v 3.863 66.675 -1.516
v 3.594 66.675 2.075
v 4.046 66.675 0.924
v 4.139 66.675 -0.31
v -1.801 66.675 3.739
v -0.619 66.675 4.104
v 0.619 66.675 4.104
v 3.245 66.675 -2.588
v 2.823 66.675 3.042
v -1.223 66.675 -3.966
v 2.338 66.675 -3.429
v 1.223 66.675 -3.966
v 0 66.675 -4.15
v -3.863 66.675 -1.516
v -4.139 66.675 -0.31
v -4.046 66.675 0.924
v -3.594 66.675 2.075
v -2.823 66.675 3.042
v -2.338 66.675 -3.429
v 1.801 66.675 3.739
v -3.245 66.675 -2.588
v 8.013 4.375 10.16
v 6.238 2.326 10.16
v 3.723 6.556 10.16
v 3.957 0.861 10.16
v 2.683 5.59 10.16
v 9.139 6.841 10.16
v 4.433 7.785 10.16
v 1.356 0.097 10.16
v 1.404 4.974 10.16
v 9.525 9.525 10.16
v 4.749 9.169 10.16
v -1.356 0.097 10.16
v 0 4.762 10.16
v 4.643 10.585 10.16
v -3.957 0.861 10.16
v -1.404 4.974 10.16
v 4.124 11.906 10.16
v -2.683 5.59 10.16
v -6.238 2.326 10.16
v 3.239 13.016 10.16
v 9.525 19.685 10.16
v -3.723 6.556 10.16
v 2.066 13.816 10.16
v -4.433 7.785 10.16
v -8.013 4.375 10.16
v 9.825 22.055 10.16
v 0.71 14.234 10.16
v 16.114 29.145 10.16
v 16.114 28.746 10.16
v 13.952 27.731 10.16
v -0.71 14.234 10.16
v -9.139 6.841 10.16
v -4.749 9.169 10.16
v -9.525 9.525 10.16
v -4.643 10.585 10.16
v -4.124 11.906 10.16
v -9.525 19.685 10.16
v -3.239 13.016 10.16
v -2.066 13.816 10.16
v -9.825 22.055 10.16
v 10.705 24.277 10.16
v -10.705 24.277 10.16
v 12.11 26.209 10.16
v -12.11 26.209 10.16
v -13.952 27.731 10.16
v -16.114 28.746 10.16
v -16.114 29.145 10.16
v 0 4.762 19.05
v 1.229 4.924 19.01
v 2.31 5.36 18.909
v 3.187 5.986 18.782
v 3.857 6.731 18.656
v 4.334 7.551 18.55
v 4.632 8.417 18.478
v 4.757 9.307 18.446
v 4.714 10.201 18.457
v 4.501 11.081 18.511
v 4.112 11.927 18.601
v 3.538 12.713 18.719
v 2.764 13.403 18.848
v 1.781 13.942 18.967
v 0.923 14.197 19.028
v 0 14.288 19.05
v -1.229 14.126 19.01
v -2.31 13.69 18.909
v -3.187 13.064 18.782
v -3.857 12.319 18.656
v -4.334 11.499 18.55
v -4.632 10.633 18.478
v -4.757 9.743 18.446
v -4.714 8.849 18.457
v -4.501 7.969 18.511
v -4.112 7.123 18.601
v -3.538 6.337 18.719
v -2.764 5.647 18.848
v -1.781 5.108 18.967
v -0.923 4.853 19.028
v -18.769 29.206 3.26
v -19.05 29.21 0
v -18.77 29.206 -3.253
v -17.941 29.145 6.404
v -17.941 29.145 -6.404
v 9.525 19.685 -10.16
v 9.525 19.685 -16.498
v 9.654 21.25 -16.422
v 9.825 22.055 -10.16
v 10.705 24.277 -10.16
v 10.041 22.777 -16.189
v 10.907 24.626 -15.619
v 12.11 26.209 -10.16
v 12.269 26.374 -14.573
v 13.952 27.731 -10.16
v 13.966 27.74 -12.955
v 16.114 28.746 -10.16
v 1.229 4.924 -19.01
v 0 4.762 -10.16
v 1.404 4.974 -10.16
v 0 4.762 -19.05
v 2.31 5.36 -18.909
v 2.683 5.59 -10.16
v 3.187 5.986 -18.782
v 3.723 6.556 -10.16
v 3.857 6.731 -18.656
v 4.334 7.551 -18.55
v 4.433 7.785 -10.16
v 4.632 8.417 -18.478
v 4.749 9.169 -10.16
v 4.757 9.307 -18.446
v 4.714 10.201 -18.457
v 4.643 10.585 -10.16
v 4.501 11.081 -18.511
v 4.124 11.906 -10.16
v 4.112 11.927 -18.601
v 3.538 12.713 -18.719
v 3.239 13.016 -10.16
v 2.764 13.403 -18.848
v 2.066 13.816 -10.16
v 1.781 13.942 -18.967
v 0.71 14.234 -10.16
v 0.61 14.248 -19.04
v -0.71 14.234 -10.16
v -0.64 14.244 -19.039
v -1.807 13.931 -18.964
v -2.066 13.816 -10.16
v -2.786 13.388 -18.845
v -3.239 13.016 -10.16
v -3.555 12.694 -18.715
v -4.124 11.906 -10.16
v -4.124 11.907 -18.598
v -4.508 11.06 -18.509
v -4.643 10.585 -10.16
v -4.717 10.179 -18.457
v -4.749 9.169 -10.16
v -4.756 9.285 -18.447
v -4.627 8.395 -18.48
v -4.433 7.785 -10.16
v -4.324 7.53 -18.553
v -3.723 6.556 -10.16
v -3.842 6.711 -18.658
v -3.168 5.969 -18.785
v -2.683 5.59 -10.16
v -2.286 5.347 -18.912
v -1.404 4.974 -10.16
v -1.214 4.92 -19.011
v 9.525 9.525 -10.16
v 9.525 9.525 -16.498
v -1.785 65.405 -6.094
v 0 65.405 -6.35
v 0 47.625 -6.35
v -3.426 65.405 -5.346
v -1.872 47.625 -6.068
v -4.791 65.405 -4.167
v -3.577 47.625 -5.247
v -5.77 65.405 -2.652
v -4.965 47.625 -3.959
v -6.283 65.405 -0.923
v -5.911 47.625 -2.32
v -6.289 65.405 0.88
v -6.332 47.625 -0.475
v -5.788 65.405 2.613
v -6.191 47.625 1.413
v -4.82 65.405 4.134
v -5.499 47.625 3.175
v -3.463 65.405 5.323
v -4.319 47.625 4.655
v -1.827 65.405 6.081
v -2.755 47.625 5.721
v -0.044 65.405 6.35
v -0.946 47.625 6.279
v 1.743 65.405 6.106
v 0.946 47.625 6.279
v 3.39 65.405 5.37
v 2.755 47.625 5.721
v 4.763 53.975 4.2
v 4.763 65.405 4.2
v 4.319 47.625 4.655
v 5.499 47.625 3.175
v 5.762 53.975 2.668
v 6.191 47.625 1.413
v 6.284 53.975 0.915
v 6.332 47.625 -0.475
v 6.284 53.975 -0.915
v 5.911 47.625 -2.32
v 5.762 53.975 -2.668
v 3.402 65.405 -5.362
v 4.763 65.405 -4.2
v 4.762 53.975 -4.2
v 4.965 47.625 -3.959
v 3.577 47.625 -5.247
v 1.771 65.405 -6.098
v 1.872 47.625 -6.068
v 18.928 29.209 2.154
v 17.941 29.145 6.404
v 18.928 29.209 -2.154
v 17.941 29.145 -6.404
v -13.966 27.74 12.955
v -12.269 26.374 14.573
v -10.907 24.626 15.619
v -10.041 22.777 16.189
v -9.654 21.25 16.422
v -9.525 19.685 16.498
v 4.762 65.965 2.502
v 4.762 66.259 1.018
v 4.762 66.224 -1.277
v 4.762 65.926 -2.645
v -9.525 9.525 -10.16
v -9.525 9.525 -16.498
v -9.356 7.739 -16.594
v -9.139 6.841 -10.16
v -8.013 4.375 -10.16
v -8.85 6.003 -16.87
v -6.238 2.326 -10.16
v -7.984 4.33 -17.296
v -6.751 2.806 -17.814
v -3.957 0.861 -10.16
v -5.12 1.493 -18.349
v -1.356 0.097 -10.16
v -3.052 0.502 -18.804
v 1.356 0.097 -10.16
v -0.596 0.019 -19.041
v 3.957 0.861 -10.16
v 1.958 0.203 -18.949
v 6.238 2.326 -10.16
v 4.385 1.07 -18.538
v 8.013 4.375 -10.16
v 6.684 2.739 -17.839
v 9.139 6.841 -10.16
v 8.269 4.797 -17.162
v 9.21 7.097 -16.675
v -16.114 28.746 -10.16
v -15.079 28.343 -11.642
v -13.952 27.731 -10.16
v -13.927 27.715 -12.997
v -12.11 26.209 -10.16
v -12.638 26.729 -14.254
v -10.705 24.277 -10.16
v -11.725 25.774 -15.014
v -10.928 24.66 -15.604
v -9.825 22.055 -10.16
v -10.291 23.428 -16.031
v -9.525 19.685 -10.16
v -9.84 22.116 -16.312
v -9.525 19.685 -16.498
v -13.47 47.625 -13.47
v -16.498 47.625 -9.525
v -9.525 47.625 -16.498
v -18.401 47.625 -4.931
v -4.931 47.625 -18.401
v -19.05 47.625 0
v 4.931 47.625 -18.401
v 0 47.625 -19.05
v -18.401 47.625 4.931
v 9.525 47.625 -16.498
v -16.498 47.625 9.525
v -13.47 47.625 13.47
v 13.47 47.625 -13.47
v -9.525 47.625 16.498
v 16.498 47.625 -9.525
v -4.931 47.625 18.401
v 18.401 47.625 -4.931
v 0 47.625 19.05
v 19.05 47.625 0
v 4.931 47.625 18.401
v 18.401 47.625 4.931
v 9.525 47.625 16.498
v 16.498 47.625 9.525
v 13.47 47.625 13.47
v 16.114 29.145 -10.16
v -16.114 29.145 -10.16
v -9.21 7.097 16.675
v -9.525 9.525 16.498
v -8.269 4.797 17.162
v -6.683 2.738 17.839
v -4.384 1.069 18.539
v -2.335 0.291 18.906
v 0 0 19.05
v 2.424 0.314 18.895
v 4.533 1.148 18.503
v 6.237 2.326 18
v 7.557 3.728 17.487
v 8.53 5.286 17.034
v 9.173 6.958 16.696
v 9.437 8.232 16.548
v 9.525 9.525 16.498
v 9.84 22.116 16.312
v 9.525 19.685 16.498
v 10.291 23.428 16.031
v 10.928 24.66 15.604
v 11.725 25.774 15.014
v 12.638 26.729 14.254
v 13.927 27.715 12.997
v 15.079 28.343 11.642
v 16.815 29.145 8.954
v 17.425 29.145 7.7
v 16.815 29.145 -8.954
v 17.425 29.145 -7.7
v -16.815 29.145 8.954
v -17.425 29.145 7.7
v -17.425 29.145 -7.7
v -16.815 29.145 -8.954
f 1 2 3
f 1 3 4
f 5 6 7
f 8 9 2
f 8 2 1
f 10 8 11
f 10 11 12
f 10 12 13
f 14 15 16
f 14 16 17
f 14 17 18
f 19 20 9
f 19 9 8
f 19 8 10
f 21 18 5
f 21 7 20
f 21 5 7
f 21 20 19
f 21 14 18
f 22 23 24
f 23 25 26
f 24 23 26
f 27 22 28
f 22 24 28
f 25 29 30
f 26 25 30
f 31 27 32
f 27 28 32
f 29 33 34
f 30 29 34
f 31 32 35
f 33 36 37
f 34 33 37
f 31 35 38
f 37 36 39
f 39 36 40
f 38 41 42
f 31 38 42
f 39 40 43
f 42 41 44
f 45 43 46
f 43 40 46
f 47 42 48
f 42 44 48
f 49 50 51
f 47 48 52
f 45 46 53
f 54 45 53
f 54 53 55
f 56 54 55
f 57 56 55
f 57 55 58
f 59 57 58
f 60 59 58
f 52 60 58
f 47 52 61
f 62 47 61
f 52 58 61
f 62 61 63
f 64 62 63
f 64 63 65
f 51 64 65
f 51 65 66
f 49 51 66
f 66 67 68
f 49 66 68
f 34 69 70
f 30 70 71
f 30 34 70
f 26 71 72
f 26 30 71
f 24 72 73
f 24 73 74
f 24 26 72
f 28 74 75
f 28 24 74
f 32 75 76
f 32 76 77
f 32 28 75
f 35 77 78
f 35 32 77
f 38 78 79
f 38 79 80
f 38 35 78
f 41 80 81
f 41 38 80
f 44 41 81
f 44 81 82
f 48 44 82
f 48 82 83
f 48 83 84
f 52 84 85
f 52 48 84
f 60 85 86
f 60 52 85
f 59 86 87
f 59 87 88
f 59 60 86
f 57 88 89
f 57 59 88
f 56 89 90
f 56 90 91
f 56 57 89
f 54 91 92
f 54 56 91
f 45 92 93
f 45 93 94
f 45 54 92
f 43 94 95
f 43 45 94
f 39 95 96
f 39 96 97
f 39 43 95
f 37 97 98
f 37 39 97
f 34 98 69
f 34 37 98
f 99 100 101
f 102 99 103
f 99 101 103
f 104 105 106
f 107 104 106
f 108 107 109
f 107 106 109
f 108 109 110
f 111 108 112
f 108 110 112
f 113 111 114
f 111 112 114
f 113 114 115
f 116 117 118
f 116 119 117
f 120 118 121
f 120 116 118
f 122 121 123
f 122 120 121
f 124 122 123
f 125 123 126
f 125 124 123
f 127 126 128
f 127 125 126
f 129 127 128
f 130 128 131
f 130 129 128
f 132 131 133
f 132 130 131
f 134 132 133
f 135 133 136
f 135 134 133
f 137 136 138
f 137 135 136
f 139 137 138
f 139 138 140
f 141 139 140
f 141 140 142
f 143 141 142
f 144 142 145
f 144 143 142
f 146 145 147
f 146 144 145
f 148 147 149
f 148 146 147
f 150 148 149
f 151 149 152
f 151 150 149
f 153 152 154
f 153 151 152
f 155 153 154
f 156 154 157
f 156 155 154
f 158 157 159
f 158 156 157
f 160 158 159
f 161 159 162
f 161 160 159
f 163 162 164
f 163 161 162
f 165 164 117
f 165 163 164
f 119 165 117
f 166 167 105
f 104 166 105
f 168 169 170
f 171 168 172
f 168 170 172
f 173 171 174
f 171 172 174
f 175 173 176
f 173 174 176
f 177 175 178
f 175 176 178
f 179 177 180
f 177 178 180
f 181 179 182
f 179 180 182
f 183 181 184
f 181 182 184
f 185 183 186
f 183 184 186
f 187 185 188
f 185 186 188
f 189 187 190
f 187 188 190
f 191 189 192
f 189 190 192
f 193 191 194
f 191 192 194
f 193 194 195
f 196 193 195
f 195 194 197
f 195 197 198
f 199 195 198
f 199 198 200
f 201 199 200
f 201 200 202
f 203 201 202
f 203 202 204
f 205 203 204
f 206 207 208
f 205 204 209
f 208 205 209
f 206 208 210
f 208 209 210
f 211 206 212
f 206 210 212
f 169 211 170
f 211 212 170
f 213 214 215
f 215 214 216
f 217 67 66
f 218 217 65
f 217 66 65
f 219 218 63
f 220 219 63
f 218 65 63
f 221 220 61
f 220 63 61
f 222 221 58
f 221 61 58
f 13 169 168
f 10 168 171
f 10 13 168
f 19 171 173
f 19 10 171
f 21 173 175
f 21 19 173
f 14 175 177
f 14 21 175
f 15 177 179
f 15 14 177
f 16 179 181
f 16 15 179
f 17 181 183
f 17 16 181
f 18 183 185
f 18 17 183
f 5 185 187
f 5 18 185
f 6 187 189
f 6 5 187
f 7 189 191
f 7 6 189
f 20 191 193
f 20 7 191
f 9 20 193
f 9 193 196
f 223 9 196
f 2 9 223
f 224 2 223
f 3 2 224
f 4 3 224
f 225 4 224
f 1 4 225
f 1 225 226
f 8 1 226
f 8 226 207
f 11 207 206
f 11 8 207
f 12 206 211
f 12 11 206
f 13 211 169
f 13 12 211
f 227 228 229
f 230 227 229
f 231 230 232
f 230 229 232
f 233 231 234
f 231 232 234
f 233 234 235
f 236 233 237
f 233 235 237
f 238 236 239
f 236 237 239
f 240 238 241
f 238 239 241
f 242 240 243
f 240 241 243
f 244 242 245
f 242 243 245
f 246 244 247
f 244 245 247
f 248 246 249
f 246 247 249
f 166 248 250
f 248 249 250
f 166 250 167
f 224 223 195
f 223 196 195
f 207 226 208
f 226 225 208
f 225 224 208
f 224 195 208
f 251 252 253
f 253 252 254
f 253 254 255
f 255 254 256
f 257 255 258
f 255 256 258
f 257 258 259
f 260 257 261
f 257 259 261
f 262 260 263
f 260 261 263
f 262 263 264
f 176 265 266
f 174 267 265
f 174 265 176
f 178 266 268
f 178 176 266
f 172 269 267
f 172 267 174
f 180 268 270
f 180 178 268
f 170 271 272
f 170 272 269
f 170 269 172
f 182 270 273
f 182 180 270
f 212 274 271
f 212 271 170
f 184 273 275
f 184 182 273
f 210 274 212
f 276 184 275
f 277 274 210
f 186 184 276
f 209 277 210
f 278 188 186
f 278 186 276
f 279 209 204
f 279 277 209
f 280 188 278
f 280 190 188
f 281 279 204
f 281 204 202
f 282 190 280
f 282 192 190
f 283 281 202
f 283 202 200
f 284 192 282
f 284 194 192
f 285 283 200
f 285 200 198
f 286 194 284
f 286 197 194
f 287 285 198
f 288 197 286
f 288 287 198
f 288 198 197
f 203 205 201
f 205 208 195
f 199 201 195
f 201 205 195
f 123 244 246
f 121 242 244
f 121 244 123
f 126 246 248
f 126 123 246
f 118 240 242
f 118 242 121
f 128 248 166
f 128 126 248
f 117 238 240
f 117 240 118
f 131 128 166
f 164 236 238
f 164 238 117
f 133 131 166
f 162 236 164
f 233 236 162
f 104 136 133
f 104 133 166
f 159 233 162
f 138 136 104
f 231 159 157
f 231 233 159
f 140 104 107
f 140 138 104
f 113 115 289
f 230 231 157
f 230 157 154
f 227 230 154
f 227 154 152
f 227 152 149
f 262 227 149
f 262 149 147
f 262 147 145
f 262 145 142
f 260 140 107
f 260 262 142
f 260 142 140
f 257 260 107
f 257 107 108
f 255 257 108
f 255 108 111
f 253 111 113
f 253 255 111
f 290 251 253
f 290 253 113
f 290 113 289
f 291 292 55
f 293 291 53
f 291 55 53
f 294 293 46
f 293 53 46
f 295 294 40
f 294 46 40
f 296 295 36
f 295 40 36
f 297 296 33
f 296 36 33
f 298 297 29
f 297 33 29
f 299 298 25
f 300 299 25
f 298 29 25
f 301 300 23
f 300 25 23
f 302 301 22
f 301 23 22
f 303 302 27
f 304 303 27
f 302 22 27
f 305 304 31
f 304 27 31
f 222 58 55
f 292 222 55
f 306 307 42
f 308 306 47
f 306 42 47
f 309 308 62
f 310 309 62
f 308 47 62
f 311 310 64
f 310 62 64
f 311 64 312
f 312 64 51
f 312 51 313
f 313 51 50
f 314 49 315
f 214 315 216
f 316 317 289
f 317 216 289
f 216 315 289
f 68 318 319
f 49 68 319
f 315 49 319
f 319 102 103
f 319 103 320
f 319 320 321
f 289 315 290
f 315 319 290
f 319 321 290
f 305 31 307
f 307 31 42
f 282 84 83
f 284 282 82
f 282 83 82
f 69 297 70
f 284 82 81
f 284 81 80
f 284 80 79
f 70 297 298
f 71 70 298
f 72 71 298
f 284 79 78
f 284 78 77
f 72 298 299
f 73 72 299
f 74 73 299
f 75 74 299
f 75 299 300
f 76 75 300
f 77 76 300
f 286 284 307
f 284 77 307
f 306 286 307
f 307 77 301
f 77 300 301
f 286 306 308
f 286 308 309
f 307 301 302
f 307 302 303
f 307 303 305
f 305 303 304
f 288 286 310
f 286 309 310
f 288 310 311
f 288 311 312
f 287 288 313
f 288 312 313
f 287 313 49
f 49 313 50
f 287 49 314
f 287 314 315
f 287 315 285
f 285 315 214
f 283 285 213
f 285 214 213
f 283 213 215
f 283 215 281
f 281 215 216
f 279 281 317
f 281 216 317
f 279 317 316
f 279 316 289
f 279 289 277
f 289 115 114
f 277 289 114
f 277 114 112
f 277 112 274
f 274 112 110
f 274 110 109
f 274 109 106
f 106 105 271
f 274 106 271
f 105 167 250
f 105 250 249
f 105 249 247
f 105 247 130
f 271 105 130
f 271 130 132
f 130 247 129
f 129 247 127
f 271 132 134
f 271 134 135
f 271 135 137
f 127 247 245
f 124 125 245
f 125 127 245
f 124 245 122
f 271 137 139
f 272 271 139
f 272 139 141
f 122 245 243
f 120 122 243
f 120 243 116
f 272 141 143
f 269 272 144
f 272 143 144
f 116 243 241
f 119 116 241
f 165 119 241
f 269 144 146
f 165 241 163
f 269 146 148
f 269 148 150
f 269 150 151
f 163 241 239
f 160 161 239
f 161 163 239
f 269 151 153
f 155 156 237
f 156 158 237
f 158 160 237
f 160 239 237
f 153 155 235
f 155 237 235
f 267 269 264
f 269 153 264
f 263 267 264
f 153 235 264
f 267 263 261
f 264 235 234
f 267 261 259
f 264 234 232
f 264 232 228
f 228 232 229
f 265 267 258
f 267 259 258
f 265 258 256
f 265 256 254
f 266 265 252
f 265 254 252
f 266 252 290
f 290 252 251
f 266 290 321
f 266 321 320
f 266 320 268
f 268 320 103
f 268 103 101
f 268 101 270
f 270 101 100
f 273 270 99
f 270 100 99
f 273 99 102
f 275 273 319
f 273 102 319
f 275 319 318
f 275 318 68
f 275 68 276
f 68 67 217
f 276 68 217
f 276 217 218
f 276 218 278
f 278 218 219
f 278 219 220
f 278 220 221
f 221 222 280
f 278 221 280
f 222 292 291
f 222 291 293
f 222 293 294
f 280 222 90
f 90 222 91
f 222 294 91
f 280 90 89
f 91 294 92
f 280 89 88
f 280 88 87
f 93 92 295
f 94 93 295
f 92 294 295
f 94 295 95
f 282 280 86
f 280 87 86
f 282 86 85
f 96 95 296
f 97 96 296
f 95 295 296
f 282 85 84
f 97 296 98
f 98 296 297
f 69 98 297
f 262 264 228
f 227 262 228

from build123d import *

# Parameters (mm, degrees)
SKETCH1_R               = 19.05
BASE_EXTRUDE_DEPTH      = 47.625
CUT_EXTRUDE1_DEPTH      = 55.716959208
CUT_EXTRUDE1_DEPTH_BACK = 55.716959208
CUT_EXTRUDE5_DEPTH      = 47.625
CUT_EXTRUDE5_DEPTH_BACK = 55.716959365
SKETCH8_W               = 20.32
SKETCH8_H               = 36.600526062
CUT_EXTRUDE6_DEPTH      = 55.716959365
CUT_EXTRUDE6_DEPTH_BACK = 55.716959365
SKETCH11_R              = 4.7625
SKETCH12_R              = 6.35
BOSS_EXTRUDE1_DEPTH     = 19.05
CHAMFER3_SIZE           = 1.27
CHAMFER3_SIZE2          = 2.199704526
CUT_EXTRUDE7_START      = -12.7
CUT_EXTRUDE7_DEPTH      = 12.7


with BuildPart() as part:
    # Sketch1 → Base-Extrude (new body)
    with BuildSketch(Plane(origin=(0, 0, 0), x_dir=(-1, 0, 0), z_dir=(0, 1, 0))):
        Circle(SKETCH1_R)
    extrude(amount=BASE_EXTRUDE_DEPTH)

    # Sketch2 → Cut-Extrude1 (cut, two sides: drawn at the far end of the back side and taken through both)
    with BuildSketch(Plane.XY.offset(-CUT_EXTRUDE1_DEPTH_BACK)):
        with BuildLine():
            Line((9.525, 9.525), (9.525, 19.685))
            ThreePointArc((9.525, 19.685), (12.314807909, 26.420192091), (19.05, 29.21))
            Line((19.05, 29.21), (19.05, -1.366191125))
            Line((19.05, -1.366191125), (-19.05, -1.366191125))
            Line((-19.05, -1.366191125), (-19.05, 29.21))
            ThreePointArc((-19.05, 29.21), (-12.314807909, 26.420192091), (-9.525, 19.685))
            Line((-9.525, 19.685), (-9.525, 9.525))
            ThreePointArc((-9.525, 9.525), (0, 0), (9.525, 9.525))
        make_face()
    extrude(amount=CUT_EXTRUDE1_DEPTH + CUT_EXTRUDE1_DEPTH_BACK, mode=Mode.SUBTRACT)

    # Sketch8 → Cut-Extrude5 (cut, two sides: drawn at the far end of the back side and taken through both)
    with BuildSketch(Plane(origin=(0, 0, 0), x_dir=(0, 0, -1), z_dir=(1, 0, 0)).offset(-CUT_EXTRUDE5_DEPTH_BACK)):
        with Locations((0, 10.844975795)):
            Rectangle(SKETCH8_W, SKETCH8_H)
    extrude(amount=CUT_EXTRUDE5_DEPTH + CUT_EXTRUDE5_DEPTH_BACK, mode=Mode.SUBTRACT)

    # Sketch11 → Cut-Extrude6 (cut, two sides: drawn at the far end of the back side and taken through both)
    with BuildSketch(Plane.XY.offset(-CUT_EXTRUDE6_DEPTH_BACK)):
        with Locations((0, 9.525)):
            Circle(SKETCH11_R)
    extrude(amount=CUT_EXTRUDE6_DEPTH + CUT_EXTRUDE6_DEPTH_BACK, mode=Mode.SUBTRACT)

    # Sketch12 → Boss-Extrude1 (add)
    with BuildSketch(Plane(origin=(0, 47.625, 0), x_dir=(-1, 0, 0), z_dir=(0, 1, 0))):
        Circle(SKETCH12_R)
    extrude(amount=BOSS_EXTRUDE1_DEPTH)

    # Chamfer3
    chamfer3_edges = [part.edges().sort_by_distance(p)[0] for p in [
        (6.35, 66.675, 0),
    ]]
    chamfer3_side = [part.faces().sort_by_distance(p)[0] for p in [
        (6.35, 57.15, 0),
    ]]
    chamfer(chamfer3_edges, length=CHAMFER3_SIZE, length2=CHAMFER3_SIZE2, reference=chamfer3_side[0])

    # Sketch13 → Cut-Extrude7 (cut)
    with BuildSketch(Plane(origin=(0, 66.675, 0), x_dir=(-1, 0, 0), z_dir=(0, 1, 0)).offset(CUT_EXTRUDE7_START)):
        with BuildLine():
            Line((-4.7625, 4.200130206), (-4.7625, -4.200130206))
            ThreePointArc((-4.7625, -4.200130206), (-6.35, 0), (-4.7625, 4.200130206))
        make_face()
    extrude(amount=CUT_EXTRUDE7_DEPTH, mode=Mode.SUBTRACT)


solid = part.part
